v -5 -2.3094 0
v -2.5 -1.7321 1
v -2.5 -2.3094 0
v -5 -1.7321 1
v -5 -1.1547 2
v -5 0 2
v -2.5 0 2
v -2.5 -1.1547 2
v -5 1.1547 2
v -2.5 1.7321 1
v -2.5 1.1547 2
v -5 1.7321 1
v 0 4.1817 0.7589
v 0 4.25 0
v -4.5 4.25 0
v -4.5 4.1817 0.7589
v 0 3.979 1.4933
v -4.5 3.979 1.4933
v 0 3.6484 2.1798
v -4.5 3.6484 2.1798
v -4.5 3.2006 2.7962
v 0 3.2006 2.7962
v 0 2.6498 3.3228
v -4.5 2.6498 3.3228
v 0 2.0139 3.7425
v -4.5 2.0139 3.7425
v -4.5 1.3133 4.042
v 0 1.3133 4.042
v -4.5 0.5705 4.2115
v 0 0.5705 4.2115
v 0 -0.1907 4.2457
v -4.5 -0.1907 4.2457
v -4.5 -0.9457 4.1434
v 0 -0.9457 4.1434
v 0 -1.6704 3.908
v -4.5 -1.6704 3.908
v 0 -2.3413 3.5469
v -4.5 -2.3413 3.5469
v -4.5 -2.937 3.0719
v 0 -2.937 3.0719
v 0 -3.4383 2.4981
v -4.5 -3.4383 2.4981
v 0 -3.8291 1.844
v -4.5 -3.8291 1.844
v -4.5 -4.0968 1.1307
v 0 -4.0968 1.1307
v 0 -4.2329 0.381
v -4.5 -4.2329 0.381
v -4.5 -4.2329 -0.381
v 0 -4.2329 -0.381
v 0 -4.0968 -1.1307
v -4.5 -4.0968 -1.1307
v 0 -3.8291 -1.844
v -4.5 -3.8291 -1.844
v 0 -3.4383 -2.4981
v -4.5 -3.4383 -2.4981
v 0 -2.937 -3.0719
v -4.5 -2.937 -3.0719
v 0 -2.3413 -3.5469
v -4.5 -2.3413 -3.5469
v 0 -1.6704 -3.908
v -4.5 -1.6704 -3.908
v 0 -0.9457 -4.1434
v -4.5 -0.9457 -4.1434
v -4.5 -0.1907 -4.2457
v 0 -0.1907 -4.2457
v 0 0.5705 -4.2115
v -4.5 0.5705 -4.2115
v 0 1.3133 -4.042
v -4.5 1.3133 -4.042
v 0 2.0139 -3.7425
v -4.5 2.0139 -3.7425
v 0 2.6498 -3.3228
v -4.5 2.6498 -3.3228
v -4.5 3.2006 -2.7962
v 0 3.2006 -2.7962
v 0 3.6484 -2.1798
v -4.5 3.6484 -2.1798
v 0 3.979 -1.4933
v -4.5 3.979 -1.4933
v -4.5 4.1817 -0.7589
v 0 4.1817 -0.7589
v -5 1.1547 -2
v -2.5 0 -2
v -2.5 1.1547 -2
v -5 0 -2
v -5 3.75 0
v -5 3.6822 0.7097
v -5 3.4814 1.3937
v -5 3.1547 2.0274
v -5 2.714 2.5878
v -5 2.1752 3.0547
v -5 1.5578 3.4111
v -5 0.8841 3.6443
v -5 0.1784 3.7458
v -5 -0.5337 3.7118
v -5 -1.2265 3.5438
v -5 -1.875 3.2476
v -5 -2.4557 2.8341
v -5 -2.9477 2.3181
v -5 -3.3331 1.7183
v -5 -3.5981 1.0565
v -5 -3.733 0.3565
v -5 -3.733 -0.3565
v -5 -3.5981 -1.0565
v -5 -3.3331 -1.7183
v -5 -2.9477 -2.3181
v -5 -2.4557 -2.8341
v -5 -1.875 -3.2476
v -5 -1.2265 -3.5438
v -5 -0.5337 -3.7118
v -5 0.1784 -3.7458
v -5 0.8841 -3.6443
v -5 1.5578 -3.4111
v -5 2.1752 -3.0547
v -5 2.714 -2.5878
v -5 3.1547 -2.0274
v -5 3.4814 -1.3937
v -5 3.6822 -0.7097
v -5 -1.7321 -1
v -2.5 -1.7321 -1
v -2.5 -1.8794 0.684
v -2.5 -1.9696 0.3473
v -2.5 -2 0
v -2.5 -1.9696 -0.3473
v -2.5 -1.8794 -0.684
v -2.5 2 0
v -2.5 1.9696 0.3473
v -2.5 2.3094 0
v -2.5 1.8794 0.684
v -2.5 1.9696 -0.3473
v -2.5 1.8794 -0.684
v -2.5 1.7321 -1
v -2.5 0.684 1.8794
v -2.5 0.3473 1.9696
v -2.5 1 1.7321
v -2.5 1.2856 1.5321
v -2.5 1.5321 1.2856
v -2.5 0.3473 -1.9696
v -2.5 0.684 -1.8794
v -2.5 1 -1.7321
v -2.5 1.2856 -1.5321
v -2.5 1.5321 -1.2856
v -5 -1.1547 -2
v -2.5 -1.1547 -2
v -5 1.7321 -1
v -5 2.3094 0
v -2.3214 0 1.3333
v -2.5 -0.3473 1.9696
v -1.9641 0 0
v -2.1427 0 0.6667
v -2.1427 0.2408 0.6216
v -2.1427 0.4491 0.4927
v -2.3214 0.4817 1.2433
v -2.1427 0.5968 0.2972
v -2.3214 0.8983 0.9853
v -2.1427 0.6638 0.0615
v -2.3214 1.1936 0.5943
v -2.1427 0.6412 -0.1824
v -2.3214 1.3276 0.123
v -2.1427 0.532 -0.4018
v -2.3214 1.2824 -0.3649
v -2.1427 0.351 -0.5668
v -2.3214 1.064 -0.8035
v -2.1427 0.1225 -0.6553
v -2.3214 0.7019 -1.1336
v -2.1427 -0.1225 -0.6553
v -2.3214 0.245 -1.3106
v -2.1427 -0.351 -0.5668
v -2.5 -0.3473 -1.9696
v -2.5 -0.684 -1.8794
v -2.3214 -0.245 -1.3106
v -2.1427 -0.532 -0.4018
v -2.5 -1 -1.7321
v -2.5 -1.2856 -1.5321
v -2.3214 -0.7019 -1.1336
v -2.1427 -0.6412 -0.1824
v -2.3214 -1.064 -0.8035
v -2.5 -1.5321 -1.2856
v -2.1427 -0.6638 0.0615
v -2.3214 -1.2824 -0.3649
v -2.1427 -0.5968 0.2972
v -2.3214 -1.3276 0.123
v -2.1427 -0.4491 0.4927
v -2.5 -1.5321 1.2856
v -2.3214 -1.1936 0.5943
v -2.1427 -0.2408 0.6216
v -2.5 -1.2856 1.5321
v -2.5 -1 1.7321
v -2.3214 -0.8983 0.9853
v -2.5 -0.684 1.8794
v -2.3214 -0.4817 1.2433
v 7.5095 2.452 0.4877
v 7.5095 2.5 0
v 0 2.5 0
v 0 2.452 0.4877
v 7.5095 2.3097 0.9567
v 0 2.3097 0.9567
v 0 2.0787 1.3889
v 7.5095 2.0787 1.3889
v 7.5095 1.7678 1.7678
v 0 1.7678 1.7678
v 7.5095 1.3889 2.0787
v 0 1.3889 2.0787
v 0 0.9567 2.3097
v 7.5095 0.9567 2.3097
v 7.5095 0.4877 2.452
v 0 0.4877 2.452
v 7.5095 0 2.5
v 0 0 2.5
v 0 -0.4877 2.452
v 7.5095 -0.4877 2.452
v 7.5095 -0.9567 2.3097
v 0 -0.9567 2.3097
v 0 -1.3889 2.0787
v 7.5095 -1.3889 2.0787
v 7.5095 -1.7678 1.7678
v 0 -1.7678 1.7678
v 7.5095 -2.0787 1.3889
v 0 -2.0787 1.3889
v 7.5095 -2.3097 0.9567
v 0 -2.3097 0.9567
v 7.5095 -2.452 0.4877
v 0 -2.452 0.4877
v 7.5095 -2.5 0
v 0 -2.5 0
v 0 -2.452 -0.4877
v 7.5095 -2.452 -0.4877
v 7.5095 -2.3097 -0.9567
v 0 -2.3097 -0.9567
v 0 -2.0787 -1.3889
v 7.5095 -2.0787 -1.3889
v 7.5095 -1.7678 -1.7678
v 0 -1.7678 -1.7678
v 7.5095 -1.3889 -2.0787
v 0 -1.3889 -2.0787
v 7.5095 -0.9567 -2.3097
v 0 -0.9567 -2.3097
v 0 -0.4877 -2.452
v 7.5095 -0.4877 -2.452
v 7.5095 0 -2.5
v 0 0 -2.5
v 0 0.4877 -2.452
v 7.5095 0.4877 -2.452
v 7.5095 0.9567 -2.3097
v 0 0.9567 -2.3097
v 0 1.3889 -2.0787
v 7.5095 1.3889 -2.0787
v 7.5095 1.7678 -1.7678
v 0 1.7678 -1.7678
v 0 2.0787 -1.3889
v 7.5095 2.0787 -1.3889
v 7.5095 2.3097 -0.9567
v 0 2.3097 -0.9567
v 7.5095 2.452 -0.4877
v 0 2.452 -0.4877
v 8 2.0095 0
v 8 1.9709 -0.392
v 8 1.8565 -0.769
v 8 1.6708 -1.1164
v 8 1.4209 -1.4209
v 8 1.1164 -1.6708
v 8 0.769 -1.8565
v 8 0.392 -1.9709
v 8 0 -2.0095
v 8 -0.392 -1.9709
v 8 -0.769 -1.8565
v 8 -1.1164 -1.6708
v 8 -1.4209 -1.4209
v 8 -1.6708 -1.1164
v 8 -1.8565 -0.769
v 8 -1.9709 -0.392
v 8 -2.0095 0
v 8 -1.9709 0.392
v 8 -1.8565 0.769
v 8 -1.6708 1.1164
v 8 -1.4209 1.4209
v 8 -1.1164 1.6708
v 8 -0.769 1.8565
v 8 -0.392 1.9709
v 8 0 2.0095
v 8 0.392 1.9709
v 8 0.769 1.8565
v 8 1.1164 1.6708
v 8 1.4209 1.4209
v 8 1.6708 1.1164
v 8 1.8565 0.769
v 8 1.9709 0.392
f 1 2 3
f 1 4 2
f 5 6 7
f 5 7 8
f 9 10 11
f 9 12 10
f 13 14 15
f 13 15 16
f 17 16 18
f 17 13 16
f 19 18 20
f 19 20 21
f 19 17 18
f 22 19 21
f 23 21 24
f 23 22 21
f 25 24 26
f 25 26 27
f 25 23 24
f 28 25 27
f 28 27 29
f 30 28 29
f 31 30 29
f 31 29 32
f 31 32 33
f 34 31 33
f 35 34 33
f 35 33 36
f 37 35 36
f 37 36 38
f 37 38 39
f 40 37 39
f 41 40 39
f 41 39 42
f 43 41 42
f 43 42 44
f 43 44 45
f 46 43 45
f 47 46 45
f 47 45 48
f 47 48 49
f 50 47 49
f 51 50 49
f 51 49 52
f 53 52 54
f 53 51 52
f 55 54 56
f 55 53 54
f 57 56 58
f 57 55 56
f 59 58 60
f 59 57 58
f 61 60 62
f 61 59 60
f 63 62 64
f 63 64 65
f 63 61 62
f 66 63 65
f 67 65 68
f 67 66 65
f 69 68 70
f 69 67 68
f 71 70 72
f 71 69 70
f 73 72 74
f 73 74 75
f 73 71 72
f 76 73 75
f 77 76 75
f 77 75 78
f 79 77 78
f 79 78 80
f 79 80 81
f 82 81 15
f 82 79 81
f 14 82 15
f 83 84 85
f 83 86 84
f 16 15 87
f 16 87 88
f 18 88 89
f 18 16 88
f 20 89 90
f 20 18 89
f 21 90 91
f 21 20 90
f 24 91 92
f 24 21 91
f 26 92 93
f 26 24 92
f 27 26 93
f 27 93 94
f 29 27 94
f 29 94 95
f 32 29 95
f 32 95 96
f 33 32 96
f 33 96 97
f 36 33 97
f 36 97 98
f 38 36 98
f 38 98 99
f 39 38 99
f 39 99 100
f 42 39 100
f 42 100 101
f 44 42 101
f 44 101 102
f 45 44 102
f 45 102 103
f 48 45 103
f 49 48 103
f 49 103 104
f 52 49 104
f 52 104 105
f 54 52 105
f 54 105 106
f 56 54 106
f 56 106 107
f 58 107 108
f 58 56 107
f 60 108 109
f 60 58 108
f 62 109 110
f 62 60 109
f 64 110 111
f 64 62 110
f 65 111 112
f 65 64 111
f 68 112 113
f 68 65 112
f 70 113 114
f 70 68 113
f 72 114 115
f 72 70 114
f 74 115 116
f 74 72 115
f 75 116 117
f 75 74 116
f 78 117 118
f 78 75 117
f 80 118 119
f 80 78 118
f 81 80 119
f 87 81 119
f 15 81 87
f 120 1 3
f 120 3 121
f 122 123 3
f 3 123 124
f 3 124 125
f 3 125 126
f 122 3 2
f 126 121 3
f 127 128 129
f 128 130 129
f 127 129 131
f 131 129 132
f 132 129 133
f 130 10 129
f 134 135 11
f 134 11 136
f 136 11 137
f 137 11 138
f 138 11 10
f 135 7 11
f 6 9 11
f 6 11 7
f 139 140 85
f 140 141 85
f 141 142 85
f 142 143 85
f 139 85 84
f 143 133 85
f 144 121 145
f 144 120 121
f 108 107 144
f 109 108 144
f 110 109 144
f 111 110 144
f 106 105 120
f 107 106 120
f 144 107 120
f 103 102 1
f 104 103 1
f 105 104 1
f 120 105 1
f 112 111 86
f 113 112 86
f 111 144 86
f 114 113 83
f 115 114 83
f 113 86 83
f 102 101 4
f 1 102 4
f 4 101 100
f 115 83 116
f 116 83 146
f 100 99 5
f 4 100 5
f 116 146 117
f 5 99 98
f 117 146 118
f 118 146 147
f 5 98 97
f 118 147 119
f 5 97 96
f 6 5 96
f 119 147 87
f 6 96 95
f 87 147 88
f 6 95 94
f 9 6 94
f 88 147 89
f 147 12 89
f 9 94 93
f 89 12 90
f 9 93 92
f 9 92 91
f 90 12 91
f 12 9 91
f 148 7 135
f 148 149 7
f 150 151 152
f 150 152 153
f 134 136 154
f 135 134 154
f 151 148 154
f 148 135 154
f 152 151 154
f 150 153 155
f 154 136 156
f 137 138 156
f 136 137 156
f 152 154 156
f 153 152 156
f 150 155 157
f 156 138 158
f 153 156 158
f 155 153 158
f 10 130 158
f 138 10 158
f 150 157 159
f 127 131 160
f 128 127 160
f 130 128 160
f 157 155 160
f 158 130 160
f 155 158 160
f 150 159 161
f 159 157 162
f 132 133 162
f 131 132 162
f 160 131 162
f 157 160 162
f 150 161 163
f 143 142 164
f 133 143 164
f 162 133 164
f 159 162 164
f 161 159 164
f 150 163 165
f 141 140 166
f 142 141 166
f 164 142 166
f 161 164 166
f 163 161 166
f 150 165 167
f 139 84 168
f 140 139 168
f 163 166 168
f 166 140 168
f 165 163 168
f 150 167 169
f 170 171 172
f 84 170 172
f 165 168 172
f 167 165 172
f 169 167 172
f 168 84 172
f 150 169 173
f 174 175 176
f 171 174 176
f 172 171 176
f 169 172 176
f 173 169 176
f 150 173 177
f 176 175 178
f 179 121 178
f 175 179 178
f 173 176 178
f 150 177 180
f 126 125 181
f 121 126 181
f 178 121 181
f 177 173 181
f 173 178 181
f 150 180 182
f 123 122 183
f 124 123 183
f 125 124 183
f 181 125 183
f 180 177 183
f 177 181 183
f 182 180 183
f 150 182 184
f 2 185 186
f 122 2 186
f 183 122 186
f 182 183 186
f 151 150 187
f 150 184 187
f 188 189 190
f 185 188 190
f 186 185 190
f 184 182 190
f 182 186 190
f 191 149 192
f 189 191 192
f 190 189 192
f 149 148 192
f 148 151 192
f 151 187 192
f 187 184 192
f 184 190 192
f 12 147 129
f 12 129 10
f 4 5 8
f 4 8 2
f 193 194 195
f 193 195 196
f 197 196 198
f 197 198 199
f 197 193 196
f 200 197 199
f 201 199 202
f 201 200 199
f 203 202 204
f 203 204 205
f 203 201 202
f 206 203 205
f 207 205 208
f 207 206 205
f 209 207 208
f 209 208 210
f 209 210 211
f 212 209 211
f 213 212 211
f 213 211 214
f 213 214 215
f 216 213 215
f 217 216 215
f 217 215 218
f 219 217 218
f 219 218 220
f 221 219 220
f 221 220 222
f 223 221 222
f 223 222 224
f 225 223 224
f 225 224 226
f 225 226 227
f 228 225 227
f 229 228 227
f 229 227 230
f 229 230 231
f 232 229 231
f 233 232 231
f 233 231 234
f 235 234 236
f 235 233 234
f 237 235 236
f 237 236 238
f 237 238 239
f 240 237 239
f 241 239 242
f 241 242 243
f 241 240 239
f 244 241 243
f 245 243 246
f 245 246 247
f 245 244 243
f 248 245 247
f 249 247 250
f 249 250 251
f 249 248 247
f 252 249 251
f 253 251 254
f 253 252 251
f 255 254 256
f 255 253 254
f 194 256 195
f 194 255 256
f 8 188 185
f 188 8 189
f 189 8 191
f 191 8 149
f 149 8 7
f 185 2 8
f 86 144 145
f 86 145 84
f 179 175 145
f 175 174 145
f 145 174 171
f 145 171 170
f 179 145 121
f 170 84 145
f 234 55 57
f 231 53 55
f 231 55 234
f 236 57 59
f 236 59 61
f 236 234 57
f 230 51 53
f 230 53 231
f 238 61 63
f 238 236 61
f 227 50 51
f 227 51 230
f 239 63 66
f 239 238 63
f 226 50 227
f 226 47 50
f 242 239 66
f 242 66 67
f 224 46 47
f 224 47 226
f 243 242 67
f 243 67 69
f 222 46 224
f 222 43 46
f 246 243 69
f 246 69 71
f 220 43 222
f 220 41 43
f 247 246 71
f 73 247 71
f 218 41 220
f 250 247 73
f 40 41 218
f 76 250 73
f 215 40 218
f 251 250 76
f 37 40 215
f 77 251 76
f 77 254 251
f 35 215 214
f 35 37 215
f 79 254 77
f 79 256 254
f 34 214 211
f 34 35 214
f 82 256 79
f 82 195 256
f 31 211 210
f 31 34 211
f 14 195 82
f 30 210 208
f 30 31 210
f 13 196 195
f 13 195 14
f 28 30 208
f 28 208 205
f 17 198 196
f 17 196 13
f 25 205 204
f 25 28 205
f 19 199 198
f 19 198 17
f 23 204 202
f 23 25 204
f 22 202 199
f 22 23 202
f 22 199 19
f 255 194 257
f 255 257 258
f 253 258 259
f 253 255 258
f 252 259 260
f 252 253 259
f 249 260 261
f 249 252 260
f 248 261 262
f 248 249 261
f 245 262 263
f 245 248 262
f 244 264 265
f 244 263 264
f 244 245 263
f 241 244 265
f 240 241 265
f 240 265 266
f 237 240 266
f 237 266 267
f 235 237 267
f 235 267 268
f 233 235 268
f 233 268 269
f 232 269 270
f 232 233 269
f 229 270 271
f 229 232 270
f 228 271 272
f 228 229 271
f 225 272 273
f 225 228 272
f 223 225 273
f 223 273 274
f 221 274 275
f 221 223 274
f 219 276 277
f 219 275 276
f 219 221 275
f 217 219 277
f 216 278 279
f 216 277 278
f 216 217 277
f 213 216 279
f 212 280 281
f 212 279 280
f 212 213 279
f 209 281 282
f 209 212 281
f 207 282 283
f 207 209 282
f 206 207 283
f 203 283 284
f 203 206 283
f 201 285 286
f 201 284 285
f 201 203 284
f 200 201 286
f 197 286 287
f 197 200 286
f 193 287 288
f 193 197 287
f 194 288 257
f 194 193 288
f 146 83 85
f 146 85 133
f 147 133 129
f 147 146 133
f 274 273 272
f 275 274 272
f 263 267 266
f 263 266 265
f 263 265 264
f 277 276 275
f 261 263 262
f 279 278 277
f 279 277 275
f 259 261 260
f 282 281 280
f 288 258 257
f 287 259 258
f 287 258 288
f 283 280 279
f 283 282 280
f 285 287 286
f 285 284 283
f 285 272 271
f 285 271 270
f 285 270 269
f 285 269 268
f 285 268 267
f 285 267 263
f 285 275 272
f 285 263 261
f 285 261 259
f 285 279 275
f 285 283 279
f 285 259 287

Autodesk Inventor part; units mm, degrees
sketch "Sketch_1" plane through (0, 0, 0) normal (0, 0, 1) x (1, 0, 0)
  line L0 (8, 0) -> (-5, 0)
  line L1 (-5, 0) -> (-5, 3.75)
  line L2 (-5, 3.75) -> (-4.5, 4.25)
  line L3 (-4.5, 4.25) -> (0, 4.25)
  line L4 (0, 4.25) -> (0, 2.5)
  line L5 (0, 2.5) -> (7.5095, 2.5)
  line L6 (7.5095, 2.5) -> (8, 2.0095)
  line L7 (8, 2.0095) -> (8, 0)
  line L8 (8, 0) -> (-5, 0)
revolve "Revolution1" add sketch "Sketch_1" angle 360 about axis through (8, 0, 0) along (1, 0, 0)
thread "Thread1" size "M5x0.8" class "6g" standard "ISO Metric profile" length 6.7095
sketch "Sketch2" plane through (-5, 0, 0) normal (-1, 0, 0) x (0, 0, 1)
  point P0 (0, 0)
hole "Hole1" at (-5, 0, 0) direction (1, 0, 0) diameter 4 depth 2.5 tip angle 150
sketch "Sketch_3" plane through (-5, 0, 0) normal (1, 0, 0) x (0, 0, -1)
  line L0 (-2, -1.1547) -> (0, -2.3094)
  line L1 (0, -2.3094) -> (2, -1.1547)
  line L2 (2, -1.1547) -> (2, 1.1547)
  line L3 (2, 1.1547) -> (0, 2.3094)
  line L4 (0, 2.3094) -> (-2, 1.1547)
  line L5 (-2, 1.1547) -> (-2, -1.1547)
extrude "Extrusion1" cut sketch "Sketch_3" along normal blind 2.5
ref_plane "bolt_XY" through (0, 0, 0) normal (1, 0, 0) x (0, 0, -1)
ref_plane "bolt_YZ" through (0, 0, 0) normal (0, 0, -1) x (0, 1, 0)
ref_plane "bolt_ZX" through (0, 0, 0) normal (0, 1, 0) x (1, 0, 0)
ref_plane "nut_XY" through (8, 0, 0) normal (1, 0, 0) x (0, 0, -1)
ref_plane "nut_YZ" through (8, 0, 0) normal (0, 0, -1) x (0, 1, 0)
ref_plane "nut_ZX" through (8, 0, 0) normal (0, 1, 0) x (1, 0, 0)
properties part number "SCB5-8" material "鋼"
